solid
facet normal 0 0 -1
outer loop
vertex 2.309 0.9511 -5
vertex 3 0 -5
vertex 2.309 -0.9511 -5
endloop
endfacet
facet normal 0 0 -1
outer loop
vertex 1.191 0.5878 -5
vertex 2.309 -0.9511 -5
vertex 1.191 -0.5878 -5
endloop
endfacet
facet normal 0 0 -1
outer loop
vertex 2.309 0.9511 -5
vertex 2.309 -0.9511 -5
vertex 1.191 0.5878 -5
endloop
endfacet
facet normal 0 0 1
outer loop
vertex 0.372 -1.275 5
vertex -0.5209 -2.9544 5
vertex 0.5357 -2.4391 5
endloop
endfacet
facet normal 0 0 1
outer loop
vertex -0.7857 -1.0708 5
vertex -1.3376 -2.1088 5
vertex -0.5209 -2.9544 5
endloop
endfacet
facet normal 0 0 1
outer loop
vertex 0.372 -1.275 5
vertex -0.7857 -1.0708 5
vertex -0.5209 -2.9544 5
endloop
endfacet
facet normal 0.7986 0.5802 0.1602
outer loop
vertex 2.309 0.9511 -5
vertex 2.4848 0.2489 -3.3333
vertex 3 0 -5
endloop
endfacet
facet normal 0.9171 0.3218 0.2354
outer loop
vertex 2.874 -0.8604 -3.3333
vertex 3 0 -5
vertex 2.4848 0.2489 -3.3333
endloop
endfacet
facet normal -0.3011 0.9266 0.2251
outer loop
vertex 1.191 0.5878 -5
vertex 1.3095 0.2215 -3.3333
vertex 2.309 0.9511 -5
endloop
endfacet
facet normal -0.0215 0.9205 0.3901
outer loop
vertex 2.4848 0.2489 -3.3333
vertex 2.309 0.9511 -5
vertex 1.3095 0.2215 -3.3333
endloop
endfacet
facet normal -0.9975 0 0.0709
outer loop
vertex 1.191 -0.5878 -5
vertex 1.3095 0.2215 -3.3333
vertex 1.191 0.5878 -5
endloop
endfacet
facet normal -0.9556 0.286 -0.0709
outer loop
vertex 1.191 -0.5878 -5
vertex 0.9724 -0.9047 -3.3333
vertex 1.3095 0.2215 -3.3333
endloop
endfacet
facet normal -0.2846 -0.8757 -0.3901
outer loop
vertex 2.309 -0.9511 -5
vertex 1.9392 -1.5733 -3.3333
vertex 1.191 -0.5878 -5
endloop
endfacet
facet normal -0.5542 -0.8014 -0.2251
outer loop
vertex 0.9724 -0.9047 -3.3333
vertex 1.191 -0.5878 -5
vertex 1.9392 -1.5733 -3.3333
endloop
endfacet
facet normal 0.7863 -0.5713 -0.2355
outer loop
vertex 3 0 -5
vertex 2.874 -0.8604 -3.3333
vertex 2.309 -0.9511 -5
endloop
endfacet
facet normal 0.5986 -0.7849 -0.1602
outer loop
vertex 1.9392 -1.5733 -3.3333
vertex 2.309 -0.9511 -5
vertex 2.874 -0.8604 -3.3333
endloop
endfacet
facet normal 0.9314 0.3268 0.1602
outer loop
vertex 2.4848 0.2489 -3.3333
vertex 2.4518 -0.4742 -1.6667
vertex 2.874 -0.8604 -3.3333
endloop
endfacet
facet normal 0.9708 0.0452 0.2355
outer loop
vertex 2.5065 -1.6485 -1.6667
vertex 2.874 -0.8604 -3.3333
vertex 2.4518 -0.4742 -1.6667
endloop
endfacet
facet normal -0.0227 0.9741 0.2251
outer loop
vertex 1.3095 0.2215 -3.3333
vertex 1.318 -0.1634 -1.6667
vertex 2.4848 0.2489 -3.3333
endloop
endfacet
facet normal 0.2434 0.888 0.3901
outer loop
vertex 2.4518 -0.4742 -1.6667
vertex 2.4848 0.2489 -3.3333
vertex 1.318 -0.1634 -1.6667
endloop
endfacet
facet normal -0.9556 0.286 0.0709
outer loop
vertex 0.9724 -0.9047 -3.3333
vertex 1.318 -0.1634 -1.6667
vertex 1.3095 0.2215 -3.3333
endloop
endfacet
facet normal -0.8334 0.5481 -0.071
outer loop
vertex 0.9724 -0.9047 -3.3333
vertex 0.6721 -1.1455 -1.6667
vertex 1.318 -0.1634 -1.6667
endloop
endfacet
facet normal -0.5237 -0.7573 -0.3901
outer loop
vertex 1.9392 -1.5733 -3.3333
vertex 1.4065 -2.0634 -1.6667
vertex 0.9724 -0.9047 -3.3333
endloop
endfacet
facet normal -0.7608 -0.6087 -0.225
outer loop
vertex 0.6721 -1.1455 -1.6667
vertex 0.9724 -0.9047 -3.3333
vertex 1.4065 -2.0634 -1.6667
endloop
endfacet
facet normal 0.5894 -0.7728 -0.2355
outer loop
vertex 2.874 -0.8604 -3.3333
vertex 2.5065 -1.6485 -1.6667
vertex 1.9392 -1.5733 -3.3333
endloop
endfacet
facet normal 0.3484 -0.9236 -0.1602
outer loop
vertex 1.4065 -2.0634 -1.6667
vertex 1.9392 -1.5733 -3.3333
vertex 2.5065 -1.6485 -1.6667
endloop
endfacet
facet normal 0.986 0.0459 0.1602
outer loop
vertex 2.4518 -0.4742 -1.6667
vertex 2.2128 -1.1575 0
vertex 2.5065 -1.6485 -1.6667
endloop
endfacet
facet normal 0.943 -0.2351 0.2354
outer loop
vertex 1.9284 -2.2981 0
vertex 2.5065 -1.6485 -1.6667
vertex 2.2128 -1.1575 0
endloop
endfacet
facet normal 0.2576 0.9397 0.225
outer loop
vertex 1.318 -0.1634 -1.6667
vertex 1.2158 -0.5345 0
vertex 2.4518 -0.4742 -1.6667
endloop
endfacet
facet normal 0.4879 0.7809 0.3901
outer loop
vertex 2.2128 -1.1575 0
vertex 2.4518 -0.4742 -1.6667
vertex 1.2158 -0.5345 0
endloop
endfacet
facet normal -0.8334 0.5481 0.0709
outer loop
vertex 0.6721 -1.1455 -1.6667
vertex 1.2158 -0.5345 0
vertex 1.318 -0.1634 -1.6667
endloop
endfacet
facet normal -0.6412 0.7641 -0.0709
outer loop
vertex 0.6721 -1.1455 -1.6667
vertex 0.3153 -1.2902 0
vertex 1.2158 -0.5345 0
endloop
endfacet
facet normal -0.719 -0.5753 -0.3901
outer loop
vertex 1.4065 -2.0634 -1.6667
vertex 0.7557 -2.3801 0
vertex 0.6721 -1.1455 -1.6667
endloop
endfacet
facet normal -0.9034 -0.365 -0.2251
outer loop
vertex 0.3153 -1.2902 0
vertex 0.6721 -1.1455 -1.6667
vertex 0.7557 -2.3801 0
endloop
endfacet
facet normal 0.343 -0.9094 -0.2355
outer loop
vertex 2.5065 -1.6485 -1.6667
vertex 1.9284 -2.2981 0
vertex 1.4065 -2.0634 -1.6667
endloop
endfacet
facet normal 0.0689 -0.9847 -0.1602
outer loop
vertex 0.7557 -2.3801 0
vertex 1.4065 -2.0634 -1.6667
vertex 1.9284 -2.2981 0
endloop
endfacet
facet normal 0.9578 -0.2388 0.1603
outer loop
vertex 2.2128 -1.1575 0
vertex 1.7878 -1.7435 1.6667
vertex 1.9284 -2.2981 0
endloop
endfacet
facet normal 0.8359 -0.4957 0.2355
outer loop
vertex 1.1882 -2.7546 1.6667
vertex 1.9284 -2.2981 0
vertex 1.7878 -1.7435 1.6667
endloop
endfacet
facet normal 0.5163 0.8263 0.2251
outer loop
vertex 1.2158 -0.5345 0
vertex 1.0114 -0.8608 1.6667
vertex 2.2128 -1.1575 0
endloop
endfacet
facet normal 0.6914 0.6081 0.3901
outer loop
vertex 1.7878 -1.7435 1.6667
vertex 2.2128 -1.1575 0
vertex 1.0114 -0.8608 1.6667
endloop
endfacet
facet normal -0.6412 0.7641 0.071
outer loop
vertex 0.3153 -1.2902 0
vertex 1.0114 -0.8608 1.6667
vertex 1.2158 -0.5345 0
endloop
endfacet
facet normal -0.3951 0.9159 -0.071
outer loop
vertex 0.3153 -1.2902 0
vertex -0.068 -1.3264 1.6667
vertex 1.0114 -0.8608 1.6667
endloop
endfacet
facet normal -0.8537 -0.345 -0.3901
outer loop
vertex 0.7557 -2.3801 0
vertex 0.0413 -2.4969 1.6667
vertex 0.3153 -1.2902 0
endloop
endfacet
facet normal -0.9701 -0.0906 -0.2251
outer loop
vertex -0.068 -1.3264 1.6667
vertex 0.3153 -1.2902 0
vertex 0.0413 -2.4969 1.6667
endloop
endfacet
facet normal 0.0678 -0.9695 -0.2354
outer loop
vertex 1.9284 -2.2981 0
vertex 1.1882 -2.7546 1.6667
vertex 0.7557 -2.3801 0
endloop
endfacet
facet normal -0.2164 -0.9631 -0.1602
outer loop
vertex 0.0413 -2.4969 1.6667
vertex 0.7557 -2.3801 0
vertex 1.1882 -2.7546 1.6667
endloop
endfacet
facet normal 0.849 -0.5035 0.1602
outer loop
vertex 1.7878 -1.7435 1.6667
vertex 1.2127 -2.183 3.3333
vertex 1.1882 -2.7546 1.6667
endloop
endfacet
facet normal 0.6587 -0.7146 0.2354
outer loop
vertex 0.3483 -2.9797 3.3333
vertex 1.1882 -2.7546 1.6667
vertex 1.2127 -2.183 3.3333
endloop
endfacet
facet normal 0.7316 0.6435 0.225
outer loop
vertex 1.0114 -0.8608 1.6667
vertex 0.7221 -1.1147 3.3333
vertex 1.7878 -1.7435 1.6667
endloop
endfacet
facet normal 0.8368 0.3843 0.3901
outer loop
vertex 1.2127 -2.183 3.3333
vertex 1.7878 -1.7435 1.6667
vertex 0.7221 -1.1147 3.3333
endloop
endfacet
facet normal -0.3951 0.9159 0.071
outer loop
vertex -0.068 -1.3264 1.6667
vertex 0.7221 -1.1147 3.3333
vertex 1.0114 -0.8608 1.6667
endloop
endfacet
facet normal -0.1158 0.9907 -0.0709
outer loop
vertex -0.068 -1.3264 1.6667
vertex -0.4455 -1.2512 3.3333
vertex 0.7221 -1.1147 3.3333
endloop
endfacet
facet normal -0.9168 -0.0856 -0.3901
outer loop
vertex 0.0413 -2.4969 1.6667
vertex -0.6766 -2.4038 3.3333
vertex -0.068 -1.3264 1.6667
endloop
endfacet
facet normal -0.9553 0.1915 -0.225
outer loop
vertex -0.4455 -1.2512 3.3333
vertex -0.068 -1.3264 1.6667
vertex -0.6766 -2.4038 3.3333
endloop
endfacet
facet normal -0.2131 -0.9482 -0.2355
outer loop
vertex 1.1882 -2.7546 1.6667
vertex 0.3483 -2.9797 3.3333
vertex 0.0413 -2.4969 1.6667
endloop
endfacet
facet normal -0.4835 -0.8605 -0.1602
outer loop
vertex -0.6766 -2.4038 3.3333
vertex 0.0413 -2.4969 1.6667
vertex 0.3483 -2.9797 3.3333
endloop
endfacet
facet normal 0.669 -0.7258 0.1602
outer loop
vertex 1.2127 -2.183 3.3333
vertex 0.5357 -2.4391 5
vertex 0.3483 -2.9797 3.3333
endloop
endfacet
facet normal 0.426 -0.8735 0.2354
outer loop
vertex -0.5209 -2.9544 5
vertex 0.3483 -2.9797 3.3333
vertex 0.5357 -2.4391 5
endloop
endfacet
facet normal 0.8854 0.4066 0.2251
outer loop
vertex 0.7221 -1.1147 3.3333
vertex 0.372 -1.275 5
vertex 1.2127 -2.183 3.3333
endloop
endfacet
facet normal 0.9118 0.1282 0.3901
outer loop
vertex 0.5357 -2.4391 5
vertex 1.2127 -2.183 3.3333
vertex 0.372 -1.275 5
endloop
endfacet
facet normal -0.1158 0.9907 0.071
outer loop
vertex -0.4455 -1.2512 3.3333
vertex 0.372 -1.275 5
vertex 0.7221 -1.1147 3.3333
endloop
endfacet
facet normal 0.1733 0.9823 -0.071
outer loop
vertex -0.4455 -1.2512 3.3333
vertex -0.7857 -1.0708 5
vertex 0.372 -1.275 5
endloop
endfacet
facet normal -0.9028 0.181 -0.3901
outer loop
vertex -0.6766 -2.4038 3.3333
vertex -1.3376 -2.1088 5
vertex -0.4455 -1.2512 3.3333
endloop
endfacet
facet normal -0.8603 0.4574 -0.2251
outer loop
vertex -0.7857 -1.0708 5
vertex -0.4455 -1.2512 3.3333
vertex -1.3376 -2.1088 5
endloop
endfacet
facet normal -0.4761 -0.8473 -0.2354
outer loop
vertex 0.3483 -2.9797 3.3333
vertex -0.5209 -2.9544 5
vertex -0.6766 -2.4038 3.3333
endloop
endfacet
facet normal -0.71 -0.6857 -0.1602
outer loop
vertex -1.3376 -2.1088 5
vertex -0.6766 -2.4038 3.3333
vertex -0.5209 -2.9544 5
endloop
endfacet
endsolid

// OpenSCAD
// Unit of length: Unit.MM
linear_extrude(height = 10.0, center = true, convexity = 10, twist = 100.0, scale = 1.0)
{
   translate(v = [2.0, 0.0])
   {
      circle(r = 1.0);
   }
}
